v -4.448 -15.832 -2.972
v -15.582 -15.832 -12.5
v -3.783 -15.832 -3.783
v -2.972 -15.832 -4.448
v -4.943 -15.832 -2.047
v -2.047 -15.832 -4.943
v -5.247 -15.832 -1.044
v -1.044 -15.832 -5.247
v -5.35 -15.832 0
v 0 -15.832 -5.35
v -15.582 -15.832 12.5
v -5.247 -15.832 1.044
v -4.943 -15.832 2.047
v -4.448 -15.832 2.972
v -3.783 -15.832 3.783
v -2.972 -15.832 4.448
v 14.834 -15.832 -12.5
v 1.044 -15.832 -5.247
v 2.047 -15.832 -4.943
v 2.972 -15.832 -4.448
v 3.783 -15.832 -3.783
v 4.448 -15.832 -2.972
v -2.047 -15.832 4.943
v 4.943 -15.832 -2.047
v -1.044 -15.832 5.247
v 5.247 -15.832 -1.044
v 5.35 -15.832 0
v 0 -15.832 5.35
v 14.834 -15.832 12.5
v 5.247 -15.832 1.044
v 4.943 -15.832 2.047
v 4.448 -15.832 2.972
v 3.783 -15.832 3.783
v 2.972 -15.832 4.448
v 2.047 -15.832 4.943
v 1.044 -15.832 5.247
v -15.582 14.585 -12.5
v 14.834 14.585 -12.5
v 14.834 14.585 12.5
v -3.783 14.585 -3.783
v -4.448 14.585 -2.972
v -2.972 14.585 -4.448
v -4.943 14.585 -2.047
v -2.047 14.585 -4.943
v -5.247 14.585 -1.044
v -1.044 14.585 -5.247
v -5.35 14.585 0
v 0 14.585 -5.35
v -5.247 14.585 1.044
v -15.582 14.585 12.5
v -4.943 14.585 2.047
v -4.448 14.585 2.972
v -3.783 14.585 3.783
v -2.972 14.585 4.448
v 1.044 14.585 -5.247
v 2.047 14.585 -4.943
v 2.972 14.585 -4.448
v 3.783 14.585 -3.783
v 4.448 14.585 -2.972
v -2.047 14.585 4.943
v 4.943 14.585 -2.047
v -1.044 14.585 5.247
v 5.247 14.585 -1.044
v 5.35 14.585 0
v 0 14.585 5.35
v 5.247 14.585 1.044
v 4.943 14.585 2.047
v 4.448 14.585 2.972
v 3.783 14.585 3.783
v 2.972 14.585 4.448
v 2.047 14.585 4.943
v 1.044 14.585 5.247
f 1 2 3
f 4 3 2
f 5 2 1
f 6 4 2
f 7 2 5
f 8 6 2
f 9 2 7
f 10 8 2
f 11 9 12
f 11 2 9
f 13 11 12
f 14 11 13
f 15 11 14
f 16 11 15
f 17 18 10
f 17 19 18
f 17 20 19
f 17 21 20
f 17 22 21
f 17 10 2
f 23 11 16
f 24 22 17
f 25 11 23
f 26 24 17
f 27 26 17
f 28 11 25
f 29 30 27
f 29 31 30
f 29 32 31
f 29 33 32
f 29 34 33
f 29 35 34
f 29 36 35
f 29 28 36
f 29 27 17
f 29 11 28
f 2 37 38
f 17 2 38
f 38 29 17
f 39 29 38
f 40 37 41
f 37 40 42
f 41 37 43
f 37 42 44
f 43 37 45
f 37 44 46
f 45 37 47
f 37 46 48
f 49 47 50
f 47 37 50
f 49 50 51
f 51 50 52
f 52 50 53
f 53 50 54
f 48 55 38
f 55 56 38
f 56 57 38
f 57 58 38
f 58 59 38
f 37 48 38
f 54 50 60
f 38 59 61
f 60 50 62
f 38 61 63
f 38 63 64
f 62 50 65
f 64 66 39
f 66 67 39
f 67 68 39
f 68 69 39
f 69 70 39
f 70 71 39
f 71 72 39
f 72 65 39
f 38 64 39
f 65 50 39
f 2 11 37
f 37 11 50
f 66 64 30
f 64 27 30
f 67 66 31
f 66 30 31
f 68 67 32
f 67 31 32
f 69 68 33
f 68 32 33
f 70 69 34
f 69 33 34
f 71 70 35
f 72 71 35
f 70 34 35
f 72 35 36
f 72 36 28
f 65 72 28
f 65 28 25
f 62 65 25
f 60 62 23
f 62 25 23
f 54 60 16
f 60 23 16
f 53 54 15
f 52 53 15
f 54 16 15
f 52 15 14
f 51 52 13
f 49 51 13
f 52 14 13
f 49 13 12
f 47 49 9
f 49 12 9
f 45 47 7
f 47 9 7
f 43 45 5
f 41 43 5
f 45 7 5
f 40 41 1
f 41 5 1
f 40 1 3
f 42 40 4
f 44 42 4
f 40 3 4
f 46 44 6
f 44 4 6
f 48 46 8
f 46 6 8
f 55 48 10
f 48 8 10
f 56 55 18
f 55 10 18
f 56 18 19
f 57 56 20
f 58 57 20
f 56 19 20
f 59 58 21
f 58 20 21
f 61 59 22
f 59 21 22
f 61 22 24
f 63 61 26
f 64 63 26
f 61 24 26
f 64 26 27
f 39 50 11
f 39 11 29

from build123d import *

# Parameters (mm, degrees)
F0_W     = 30.416689
F0_H     = 30.416687
F1_DEPTH = 12.5
F2_R     = 5.35
F3_DEPTH = 50


with BuildPart() as f1:
    # F0 (on Top) → F1 (new body, symmetric)
    with BuildSketch(Plane.XY):
        with Locations((-0.373975, -0.623292)):
            Rectangle(F0_W, F0_H)
    extrude(amount=F1_DEPTH, both=True)

    # F2 (on Front) → F3 (cut, symmetric)
    with BuildSketch(Plane.XZ):
        Circle(F2_R)
    extrude(amount=F3_DEPTH, both=True, mode=Mode.SUBTRACT)


solid = f1.part
